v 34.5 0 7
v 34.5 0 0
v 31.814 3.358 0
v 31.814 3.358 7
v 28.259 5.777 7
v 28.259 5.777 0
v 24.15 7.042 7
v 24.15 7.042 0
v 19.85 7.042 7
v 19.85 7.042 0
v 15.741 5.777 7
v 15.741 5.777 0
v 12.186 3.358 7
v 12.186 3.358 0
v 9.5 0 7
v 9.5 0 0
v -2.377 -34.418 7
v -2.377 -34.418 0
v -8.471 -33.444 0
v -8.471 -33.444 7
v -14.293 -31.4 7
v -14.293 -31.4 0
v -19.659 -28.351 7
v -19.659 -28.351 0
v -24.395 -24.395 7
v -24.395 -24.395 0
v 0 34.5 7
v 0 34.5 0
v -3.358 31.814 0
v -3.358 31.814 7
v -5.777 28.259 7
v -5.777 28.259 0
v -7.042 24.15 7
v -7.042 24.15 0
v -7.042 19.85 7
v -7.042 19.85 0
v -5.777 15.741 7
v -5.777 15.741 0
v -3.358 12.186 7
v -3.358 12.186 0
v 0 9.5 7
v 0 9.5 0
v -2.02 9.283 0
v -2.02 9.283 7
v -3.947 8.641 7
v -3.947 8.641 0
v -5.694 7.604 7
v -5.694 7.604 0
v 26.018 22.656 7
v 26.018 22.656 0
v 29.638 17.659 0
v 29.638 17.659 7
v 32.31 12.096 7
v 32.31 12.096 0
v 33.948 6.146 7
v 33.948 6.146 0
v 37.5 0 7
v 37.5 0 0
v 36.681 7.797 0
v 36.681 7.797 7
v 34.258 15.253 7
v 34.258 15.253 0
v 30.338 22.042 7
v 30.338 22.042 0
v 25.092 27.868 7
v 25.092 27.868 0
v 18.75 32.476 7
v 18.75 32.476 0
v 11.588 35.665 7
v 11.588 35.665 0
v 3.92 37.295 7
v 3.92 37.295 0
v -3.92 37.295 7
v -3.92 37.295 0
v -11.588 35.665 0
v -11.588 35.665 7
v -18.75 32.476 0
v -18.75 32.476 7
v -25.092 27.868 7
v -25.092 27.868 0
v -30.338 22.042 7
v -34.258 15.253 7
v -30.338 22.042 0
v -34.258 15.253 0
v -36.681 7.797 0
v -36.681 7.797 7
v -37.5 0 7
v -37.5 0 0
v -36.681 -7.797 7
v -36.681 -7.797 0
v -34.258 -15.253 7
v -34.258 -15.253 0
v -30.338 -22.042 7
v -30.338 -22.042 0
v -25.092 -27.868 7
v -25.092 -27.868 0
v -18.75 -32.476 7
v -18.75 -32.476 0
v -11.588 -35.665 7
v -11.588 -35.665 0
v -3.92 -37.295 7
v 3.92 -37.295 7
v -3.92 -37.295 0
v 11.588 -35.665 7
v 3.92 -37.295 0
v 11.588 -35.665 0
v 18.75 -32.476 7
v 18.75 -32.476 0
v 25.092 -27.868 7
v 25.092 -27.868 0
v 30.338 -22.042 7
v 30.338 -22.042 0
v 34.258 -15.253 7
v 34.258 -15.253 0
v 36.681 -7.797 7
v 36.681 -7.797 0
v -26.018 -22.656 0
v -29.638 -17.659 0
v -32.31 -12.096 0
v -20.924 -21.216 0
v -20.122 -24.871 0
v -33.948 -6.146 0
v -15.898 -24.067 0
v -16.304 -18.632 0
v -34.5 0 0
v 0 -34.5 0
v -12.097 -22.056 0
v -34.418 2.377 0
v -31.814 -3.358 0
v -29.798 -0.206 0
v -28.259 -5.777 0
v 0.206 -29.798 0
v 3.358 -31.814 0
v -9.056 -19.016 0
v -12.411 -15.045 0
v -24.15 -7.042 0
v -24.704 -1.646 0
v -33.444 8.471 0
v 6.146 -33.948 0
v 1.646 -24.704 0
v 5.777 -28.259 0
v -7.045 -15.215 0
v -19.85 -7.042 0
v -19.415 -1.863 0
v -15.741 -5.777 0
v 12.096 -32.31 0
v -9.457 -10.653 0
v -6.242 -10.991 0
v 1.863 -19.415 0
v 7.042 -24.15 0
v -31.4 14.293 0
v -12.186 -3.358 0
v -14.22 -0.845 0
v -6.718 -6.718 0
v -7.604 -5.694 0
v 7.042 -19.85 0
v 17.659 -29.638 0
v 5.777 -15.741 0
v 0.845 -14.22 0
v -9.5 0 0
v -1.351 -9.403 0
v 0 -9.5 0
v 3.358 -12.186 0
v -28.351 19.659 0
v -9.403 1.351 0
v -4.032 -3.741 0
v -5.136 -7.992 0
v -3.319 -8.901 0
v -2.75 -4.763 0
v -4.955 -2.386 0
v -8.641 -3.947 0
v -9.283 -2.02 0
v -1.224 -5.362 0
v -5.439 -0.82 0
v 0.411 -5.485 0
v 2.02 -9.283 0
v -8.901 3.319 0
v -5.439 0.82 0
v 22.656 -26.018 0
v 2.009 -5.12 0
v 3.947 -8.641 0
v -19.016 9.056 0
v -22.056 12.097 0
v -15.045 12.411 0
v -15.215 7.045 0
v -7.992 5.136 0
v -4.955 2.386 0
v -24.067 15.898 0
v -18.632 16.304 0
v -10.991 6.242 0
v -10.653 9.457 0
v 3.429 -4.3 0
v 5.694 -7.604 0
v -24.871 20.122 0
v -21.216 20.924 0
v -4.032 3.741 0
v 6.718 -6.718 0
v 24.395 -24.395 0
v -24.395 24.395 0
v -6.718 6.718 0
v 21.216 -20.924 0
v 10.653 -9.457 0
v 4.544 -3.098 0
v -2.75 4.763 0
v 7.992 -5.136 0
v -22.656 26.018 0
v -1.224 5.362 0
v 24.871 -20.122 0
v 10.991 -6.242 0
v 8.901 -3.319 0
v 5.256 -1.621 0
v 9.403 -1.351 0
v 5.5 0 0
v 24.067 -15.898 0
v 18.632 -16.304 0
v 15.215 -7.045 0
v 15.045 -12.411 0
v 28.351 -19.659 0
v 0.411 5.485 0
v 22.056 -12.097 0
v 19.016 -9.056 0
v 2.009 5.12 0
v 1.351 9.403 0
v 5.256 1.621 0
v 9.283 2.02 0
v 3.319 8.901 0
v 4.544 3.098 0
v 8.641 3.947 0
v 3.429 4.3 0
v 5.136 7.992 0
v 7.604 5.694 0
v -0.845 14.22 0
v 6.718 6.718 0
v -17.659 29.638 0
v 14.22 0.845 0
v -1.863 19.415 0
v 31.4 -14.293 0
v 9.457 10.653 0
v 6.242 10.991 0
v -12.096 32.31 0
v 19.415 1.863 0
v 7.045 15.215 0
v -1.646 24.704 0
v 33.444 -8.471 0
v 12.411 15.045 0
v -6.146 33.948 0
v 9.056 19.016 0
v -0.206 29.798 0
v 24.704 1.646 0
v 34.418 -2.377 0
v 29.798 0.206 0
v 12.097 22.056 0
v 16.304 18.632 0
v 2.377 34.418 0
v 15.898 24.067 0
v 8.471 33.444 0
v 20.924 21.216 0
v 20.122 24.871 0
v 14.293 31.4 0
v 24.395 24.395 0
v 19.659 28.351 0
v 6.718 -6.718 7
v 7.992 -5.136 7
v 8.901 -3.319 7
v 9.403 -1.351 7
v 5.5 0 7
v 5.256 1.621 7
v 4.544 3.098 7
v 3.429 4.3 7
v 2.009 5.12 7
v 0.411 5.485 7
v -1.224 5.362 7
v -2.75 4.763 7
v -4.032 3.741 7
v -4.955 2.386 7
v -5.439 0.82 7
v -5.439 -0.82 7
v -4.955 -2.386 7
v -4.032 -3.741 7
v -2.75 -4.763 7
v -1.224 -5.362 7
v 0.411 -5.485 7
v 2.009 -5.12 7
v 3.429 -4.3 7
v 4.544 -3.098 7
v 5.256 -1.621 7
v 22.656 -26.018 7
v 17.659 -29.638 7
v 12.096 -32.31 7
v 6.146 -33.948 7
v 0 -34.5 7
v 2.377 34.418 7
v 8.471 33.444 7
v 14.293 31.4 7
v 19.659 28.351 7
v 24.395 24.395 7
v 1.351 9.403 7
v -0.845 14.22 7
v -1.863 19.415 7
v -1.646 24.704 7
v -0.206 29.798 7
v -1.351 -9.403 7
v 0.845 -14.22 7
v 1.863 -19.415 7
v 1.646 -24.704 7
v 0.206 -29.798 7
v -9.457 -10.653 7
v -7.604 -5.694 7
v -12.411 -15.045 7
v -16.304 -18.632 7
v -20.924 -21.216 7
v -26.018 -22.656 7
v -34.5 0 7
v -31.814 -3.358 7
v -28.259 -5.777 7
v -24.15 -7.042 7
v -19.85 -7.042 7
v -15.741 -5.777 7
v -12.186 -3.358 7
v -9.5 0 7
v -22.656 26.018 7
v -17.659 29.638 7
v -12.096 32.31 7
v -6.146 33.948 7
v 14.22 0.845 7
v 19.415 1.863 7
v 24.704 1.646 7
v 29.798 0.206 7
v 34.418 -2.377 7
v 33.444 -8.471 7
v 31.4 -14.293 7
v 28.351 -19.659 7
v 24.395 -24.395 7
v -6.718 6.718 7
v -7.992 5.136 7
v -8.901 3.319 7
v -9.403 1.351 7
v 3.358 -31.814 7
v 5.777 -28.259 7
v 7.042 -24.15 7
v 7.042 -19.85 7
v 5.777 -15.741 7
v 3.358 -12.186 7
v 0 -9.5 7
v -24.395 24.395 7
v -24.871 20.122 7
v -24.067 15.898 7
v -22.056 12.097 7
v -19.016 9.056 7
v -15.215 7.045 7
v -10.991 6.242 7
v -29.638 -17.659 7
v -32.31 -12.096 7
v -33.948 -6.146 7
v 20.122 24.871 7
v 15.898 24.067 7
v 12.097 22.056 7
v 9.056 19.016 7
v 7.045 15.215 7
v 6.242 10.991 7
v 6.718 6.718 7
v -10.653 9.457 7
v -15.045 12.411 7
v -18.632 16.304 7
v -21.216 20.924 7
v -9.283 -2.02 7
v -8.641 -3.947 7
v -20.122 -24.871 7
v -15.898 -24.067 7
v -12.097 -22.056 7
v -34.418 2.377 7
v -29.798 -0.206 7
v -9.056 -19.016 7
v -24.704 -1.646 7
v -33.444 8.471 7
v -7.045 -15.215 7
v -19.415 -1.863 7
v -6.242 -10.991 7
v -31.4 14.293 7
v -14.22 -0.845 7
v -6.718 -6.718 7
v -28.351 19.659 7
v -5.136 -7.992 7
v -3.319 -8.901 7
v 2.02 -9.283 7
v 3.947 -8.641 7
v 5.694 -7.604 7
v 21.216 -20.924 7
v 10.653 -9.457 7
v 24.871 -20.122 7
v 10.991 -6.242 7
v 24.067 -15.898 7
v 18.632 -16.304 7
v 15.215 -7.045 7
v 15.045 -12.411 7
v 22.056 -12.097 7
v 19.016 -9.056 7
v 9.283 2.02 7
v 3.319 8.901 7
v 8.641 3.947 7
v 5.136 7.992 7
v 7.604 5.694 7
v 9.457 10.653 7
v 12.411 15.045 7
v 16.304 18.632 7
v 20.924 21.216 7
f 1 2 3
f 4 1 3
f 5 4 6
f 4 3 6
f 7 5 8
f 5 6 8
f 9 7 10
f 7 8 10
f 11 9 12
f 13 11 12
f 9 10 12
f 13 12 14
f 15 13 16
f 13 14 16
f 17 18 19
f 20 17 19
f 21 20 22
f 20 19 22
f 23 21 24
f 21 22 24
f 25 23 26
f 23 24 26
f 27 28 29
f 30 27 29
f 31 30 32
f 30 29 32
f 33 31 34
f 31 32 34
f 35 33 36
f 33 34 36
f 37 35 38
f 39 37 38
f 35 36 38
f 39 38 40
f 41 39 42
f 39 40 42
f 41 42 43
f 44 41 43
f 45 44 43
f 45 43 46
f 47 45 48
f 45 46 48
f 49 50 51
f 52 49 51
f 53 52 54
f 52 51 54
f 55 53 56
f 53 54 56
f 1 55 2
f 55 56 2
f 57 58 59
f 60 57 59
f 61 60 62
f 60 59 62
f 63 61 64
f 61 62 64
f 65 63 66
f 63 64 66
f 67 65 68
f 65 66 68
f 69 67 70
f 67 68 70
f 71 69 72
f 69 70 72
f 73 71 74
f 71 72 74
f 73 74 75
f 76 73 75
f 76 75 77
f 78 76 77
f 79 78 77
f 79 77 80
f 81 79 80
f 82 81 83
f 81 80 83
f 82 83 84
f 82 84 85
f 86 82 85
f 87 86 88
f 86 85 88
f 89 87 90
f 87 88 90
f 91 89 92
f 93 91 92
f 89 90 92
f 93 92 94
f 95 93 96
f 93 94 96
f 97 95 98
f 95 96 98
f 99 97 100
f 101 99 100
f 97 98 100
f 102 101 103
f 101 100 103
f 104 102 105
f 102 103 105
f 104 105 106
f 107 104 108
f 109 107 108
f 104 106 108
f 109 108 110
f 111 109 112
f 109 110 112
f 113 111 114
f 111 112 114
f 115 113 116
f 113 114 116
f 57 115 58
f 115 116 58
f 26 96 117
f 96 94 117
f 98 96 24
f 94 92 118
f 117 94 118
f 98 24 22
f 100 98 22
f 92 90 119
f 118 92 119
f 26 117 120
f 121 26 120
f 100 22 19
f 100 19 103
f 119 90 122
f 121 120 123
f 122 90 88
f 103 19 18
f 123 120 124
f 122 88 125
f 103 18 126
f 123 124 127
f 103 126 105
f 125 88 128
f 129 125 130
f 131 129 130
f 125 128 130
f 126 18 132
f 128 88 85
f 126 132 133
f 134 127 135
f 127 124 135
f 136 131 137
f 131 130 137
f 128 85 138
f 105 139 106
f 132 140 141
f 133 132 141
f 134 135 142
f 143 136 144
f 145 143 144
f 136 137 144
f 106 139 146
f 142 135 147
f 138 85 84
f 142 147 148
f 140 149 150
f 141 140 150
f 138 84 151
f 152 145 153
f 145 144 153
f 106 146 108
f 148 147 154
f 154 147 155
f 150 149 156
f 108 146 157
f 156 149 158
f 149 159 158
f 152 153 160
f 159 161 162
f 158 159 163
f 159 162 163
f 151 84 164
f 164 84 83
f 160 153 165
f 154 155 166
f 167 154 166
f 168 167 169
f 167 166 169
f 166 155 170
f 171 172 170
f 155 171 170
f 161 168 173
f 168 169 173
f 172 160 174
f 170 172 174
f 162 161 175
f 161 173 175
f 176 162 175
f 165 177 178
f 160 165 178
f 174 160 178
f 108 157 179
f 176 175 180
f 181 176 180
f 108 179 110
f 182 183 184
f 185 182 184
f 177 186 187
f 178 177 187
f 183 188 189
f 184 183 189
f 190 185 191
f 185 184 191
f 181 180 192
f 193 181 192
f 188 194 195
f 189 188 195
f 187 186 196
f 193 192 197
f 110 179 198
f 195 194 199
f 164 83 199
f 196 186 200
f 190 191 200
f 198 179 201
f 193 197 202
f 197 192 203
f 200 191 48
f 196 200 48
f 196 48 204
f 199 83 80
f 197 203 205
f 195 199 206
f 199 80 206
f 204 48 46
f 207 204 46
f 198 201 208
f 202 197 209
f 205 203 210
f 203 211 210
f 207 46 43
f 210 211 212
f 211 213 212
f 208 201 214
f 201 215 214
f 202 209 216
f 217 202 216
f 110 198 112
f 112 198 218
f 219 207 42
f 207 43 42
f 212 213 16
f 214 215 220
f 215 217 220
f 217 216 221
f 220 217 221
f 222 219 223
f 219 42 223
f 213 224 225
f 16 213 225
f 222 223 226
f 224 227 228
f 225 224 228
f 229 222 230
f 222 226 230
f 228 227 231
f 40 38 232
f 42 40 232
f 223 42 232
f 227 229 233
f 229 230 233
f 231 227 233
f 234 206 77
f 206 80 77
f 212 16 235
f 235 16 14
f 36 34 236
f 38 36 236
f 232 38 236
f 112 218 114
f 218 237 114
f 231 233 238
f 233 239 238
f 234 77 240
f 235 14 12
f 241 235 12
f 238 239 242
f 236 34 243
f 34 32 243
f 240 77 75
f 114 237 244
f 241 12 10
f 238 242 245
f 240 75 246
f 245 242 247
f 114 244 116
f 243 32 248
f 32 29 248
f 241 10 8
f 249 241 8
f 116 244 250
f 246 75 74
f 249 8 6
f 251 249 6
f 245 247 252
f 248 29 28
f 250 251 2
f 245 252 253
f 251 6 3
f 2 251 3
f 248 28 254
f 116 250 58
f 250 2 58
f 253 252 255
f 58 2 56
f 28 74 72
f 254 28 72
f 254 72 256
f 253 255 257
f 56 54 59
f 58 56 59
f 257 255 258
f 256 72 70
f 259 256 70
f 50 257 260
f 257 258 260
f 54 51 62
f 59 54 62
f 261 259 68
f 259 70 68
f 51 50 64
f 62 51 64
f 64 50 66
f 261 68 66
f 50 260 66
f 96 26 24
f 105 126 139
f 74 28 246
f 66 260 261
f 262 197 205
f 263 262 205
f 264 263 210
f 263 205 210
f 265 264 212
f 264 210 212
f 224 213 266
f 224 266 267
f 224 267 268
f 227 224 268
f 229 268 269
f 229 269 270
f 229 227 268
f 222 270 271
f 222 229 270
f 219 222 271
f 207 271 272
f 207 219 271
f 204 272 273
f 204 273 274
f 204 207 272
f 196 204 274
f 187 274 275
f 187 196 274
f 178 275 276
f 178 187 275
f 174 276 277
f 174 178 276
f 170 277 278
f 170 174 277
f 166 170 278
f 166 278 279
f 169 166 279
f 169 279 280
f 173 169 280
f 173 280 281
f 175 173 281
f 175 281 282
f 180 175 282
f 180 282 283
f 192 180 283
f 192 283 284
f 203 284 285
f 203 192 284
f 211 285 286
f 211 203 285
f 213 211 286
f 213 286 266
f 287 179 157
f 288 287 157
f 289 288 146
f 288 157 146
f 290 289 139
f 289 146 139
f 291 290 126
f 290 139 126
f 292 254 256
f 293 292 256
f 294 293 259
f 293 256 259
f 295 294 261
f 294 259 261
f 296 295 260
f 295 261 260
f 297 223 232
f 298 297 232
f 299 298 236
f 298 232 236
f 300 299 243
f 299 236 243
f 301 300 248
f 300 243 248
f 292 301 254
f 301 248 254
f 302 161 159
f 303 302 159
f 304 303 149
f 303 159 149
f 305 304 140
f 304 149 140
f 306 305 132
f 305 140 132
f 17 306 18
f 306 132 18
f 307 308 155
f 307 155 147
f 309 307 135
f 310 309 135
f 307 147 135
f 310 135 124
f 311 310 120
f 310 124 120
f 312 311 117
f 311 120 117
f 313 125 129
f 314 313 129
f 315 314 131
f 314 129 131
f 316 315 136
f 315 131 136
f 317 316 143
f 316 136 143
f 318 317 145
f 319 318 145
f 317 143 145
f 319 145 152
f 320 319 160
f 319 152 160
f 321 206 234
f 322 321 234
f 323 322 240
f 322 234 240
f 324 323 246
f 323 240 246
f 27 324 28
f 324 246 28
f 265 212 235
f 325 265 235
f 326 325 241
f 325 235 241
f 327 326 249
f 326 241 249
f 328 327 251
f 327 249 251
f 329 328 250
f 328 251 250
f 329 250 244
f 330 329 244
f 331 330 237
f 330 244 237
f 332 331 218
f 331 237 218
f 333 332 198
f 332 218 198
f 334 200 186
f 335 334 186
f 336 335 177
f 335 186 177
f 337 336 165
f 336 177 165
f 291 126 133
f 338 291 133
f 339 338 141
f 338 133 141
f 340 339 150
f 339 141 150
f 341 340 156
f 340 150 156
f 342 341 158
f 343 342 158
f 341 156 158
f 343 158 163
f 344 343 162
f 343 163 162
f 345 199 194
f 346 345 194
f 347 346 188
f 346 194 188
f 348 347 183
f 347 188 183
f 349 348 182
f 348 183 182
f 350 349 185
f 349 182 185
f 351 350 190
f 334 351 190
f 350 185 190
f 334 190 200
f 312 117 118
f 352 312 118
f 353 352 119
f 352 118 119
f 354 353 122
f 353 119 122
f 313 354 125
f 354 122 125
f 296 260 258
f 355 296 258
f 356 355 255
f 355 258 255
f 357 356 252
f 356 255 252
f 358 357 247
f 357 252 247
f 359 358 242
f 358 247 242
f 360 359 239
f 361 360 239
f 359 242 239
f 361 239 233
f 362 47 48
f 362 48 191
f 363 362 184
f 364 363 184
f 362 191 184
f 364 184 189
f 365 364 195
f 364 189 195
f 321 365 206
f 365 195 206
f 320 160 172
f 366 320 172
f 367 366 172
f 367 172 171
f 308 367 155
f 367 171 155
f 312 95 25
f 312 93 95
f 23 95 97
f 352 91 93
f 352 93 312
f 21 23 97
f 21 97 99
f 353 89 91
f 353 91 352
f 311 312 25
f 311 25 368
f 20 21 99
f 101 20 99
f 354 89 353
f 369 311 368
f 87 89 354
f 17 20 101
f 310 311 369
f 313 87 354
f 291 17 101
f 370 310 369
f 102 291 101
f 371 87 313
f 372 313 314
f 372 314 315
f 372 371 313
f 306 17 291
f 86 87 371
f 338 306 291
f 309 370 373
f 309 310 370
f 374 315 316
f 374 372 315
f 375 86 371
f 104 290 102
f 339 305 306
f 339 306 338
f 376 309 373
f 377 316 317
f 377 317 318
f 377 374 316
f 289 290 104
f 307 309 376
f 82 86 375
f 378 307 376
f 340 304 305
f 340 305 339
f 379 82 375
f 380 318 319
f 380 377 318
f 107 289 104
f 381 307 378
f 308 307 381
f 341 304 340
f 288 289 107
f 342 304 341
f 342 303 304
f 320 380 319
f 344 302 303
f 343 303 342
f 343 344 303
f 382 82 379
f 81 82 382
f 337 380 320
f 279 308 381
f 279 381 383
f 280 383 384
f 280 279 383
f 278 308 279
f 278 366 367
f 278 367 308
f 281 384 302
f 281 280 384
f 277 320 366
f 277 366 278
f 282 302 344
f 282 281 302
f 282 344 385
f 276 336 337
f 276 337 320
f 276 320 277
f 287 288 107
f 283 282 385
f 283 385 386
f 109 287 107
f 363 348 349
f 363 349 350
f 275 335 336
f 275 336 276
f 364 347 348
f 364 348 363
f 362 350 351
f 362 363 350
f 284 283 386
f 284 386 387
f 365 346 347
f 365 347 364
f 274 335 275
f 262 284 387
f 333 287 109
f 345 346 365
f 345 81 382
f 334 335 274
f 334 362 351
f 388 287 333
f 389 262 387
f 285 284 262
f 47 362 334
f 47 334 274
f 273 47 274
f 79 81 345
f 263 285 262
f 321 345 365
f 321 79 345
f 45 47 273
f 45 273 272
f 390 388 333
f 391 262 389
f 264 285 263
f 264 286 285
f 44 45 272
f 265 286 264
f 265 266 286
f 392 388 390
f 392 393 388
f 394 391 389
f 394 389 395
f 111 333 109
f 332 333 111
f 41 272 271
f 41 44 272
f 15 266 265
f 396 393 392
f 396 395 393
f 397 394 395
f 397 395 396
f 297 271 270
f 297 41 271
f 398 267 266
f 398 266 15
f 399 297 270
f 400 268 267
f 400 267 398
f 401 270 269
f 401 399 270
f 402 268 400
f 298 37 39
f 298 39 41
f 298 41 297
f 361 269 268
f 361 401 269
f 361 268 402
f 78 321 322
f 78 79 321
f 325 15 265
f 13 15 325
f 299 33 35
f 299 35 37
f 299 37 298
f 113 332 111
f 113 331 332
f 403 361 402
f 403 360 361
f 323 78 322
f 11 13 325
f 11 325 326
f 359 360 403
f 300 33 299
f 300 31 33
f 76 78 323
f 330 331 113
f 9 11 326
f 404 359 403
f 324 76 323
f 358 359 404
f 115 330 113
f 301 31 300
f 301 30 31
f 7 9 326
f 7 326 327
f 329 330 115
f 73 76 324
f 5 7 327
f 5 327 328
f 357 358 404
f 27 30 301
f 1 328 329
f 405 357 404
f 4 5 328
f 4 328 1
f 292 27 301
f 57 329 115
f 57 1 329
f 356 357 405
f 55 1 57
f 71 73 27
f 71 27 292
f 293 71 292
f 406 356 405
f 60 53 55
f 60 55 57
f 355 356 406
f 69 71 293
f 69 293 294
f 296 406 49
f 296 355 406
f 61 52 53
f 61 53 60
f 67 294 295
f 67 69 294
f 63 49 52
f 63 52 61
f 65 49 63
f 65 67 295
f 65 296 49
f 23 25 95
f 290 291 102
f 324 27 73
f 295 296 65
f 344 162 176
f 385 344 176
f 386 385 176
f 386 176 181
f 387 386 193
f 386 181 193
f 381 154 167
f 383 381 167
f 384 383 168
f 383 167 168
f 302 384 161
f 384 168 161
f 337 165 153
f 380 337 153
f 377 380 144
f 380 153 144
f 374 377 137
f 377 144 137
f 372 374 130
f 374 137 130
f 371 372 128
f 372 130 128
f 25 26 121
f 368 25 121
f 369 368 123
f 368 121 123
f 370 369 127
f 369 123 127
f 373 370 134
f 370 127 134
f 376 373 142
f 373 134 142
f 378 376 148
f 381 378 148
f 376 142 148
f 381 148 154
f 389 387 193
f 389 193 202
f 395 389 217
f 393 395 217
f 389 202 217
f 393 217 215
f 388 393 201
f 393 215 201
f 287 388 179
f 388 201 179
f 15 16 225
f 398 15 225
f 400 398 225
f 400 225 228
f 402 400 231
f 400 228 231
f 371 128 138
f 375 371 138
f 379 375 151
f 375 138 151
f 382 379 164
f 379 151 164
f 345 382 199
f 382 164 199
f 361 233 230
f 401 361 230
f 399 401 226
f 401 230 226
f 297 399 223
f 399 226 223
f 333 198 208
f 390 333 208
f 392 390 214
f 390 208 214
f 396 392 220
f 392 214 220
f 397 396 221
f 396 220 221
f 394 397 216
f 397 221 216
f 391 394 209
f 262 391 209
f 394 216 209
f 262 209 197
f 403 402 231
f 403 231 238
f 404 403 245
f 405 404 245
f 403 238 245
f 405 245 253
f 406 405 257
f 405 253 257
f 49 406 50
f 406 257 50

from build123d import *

# Parameters (mm, degrees)
F0_R     = 37.5
F0_R_2   = 5.5
F1_DEPTH = 7


with BuildPart() as f1:
    # F0 (on Top) → F1 (new body)
    with BuildSketch(Plane.XY):
        Circle(F0_R)
        with BuildLine():
            ThreePointArc((-2.377026, -34.418015), (-14.293428, -31.399808), (-24.395184, -24.395184))
            ThreePointArc((-24.395184, -24.395184), (-10.462875, -20.649823), (-6.717514, -6.717514))
            ThreePointArc((-6.717514, -6.717514), (-4.251838, -8.495403), (-1.350829, -9.403471))
            ThreePointArc((-1.350829, -9.403471), (1.909461, -22.065542), (-2.377026, -34.418015))
        make_face(mode=Mode.SUBTRACT)
        with BuildLine():
            ThreePointArc((-26.018023, -22.656401), (-32.309997, -12.096037), (-34.5, 0))
            ThreePointArc((-34.5, 0), (-22, -7.20326), (-9.5, 0))
            ThreePointArc((-9.5, 0), (-9.013661, -3.000653), (-7.604438, -5.694078))
            ThreePointArc((-7.604438, -5.694078), (-14.252502, -16.952887), (-26.018023, -22.656401))
        make_face(mode=Mode.SUBTRACT)
        with BuildLine():
            ThreePointArc((22.656401, -26.018023), (12.096037, -32.309997), (0, -34.5))
            ThreePointArc((0, -34.5), (7.20326, -22), (0, -9.5))
            ThreePointArc((0, -9.5), (3.000653, -9.013661), (5.694078, -7.604438))
            ThreePointArc((5.694078, -7.604438), (16.952887, -14.252502), (22.656401, -26.018023))
        make_face(mode=Mode.SUBTRACT)
        with BuildLine():
            ThreePointArc((9.403471, -1.350829), (22.065542, 1.909461), (34.418015, -2.377026))
            ThreePointArc((34.418015, -2.377026), (31.399808, -14.293428), (24.395184, -24.395184))
            ThreePointArc((24.395184, -24.395184), (20.649823, -10.462875), (6.717514, -6.717514))
            ThreePointArc((6.717514, -6.717514), (8.495403, -4.251838), (9.403471, -1.350829))
        make_face(mode=Mode.SUBTRACT)
        with BuildLine():
            ThreePointArc((-34.418015, 2.377026), (-31.399808, 14.293428), (-24.395184, 24.395184))
            ThreePointArc((-24.395184, 24.395184), (-20.649823, 10.462875), (-6.717514, 6.717514))
            ThreePointArc((-6.717514, 6.717514), (-8.495403, 4.251838), (-9.403471, 1.350829))
            ThreePointArc((-9.403471, 1.350829), (-22.065542, -1.909461), (-34.418015, 2.377026))
        make_face(mode=Mode.SUBTRACT)
        with BuildLine():
            ThreePointArc((-22.656401, 26.018023), (-12.096037, 32.309997), (0, 34.5))
            ThreePointArc((0, 34.5), (-7.20326, 22), (0, 9.5))
            ThreePointArc((0, 9.5), (-3.000653, 9.013661), (-5.694078, 7.604438))
            ThreePointArc((-5.694078, 7.604438), (-16.952887, 14.252502), (-22.656401, 26.018023))
        make_face(mode=Mode.SUBTRACT)
        Circle(F0_R_2, mode=Mode.SUBTRACT)
        with BuildLine():
            ThreePointArc((26.018023, 22.656401), (32.309997, 12.096037), (34.5, 0))
            ThreePointArc((34.5, 0), (22, 7.20326), (9.5, 0))
            ThreePointArc((9.5, 0), (9.013661, 3.000653), (7.604438, 5.694078))
            ThreePointArc((7.604438, 5.694078), (14.252502, 16.952887), (26.018023, 22.656401))
        make_face(mode=Mode.SUBTRACT)
        with BuildLine():
            ThreePointArc((2.377026, 34.418015), (14.293428, 31.399808), (24.395184, 24.395184))
            ThreePointArc((24.395184, 24.395184), (10.462875, 20.649823), (6.717514, 6.717514))
            ThreePointArc((6.717514, 6.717514), (4.251838, 8.495403), (1.350829, 9.403471))
            ThreePointArc((1.350829, 9.403471), (-1.909461, 22.065542), (2.377026, 34.418015))
        make_face(mode=Mode.SUBTRACT)
    extrude(amount=F1_DEPTH)


solid = f1.part
